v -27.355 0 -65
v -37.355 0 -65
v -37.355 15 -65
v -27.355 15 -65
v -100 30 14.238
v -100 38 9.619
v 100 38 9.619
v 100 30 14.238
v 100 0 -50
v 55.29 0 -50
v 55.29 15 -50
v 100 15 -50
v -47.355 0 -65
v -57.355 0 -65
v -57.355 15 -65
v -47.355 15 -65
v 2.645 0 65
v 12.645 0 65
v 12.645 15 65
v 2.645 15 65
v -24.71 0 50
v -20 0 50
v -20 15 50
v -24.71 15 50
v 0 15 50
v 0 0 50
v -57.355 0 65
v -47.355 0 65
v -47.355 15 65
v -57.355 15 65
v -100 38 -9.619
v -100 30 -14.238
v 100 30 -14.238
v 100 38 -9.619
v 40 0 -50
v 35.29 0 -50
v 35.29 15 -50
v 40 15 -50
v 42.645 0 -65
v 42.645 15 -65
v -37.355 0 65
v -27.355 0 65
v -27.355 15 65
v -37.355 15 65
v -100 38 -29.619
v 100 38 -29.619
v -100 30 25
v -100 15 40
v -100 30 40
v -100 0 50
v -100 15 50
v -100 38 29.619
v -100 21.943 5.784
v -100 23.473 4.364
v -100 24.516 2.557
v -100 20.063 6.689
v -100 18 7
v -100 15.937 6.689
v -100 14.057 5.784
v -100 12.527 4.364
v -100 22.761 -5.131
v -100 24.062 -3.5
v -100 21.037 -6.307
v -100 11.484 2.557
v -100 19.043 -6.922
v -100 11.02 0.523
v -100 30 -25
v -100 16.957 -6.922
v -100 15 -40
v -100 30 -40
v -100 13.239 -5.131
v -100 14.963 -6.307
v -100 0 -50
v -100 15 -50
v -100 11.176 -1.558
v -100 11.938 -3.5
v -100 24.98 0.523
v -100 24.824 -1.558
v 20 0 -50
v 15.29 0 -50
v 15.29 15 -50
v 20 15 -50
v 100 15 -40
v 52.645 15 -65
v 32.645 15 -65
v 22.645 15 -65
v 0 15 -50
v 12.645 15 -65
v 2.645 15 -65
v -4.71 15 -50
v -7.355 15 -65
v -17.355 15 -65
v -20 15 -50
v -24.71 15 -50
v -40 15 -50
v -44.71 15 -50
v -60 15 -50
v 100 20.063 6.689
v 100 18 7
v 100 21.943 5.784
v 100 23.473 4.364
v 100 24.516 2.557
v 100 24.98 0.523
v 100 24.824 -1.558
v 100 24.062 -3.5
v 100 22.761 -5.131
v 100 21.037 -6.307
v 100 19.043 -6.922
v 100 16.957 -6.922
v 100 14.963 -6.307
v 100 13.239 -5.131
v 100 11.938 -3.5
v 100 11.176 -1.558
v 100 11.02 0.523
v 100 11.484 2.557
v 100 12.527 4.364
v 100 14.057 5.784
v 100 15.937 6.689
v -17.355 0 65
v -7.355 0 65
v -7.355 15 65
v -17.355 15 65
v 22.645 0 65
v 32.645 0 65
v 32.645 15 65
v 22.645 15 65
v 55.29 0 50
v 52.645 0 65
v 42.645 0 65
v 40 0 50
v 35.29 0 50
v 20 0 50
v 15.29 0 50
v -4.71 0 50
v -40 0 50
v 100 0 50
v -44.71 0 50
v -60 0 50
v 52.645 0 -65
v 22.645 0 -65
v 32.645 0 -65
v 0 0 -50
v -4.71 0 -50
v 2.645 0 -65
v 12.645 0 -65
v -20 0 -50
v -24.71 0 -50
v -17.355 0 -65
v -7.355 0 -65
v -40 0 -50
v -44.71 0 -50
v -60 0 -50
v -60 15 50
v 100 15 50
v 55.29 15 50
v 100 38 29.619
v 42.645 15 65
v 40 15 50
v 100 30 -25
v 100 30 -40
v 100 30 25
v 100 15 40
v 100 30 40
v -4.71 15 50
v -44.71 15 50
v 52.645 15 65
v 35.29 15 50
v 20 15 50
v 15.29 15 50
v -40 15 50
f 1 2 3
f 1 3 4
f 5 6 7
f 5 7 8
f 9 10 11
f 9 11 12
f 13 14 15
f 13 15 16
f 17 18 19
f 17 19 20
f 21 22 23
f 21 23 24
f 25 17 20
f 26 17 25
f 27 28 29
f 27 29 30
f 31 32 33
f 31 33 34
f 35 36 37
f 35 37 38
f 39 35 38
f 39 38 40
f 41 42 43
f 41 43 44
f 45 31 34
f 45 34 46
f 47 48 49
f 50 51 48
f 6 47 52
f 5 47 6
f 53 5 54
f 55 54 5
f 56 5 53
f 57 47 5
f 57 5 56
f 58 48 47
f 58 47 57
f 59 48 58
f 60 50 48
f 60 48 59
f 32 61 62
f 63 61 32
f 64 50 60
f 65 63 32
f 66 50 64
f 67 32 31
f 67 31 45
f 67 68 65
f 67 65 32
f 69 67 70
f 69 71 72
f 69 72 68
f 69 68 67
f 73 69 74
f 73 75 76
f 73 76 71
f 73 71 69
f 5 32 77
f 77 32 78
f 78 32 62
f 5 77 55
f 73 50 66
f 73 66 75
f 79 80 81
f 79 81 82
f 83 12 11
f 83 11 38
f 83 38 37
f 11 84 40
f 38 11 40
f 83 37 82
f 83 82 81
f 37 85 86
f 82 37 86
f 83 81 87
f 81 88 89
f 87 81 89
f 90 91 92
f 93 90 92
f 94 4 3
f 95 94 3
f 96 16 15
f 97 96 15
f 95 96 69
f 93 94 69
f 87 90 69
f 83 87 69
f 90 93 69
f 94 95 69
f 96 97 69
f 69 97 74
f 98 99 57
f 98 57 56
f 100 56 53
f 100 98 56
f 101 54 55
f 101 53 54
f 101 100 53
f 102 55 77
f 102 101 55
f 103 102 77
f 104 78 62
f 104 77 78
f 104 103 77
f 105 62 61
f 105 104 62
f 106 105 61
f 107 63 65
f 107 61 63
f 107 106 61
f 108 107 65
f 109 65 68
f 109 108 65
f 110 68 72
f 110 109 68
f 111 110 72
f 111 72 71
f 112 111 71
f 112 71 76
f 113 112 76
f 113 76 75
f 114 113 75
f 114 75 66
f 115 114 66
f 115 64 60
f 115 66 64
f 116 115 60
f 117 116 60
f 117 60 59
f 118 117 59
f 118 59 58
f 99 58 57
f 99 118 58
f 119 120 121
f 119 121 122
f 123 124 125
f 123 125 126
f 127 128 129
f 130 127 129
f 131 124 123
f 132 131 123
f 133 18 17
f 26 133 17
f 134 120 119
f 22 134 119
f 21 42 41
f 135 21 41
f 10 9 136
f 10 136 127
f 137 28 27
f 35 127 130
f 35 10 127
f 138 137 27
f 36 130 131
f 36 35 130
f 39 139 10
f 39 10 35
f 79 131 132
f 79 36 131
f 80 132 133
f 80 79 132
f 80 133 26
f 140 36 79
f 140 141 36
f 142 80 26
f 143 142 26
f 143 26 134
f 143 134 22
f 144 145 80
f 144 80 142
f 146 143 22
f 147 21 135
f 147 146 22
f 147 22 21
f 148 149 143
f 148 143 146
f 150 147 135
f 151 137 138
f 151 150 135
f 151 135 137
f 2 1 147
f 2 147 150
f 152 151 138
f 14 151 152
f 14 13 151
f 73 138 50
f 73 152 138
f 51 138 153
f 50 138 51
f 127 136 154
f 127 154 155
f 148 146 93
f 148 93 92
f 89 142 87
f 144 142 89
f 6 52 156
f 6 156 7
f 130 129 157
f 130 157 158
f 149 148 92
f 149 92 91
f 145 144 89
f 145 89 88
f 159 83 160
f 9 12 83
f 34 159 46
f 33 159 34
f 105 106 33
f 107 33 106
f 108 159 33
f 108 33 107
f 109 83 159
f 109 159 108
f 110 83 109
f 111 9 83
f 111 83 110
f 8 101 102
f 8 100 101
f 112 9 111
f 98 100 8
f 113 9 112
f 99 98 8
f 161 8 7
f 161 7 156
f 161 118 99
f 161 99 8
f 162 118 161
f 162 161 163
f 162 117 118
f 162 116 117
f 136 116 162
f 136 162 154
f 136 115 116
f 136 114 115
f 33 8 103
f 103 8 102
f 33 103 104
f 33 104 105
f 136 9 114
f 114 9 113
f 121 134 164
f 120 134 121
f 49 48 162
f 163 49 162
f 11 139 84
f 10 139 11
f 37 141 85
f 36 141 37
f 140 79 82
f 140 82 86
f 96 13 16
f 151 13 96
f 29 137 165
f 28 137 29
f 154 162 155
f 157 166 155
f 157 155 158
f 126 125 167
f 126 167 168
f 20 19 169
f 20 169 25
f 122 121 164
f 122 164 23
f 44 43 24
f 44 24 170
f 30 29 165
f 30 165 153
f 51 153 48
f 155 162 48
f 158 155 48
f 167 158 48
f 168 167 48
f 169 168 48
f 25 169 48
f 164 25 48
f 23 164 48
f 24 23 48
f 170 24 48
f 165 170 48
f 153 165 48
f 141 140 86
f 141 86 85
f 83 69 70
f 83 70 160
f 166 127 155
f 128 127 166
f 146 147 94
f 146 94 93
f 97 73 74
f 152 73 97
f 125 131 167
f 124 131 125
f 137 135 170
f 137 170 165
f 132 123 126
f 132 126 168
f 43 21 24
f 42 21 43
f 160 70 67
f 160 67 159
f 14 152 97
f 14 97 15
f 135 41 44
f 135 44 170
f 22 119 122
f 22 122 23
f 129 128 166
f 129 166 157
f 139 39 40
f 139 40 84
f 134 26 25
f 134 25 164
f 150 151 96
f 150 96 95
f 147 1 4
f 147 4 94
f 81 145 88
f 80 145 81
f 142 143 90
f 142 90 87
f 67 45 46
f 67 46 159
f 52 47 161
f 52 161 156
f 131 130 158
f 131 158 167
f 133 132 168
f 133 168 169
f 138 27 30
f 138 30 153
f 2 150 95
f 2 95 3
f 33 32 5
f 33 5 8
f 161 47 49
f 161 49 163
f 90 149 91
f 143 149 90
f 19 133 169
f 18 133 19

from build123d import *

# Parameters (mm, degrees)
BOSS_EXTRUDE1_DEPTH     = 15
SKETCH2_W               = 200
SKETCH2_H               = 80
BOSS_EXTRUDE2_DEPTH     = 15
BOSS_EXTRUDE3_DEPTH     = 200
CUT_EXTRUDE1_DEPTH      = 214.703065022
CUT_EXTRUDE1_DEPTH_BACK = 214.703065022
SKETCH4_R               = 7


with BuildPart() as part:
    # Sketch1 → Boss-Extrude1 (new body)
    with BuildSketch(Plane(origin=(0, 0, 0), x_dir=(1, 0, 0), z_dir=(0, 1, 0))):
        Polygon((-60, 50), (-57.355095289, 65), (-47.355095289, 65), (-44.710190579, 50), (-40, 50), (-37.355095289, 65), (-27.355095289, 65), (-24.710190579, 50), (-20, 50), (-17.355095289, 65), (-7.355095289, 65), (-4.710190579, 50), (0, 50), (2.644904711, 65), (12.644904711, 65), (15.289809421, 50), (20, 50), (22.644904711, 65), (32.644904711, 65), (35.289809421, 50), (40, 50), (42.644904711, 65), (52.644904711, 65), (55.289809421, 50), (100, 50), (100, -50), (55.289809421, -50), (52.644904711, -65), (42.644904711, -65), (40, -50), (35.289809421, -50), (32.644904711, -65), (22.644904711, -65), (20, -50), (15.289809421, -50), (12.644904711, -65), (2.644904711, -65), (0, -50), (-4.710190579, -50), (-7.355095289, -65), (-17.355095289, -65), (-20, -50), (-24.710190579, -50), (-27.355095289, -65), (-37.355095289, -65), (-40, -50), (-44.710190579, -50), (-47.355095289, -65), (-57.355095289, -65), (-60, -50), (-100, -50), (-100, 50), align=None)
    extrude(amount=BOSS_EXTRUDE1_DEPTH)

    # Sketch2 → Boss-Extrude2 (add)
    with BuildSketch(Plane(origin=(0, 15, 0), x_dir=(1, 0, 0), z_dir=(0, 1, 0))):
        Rectangle(SKETCH2_W, SKETCH2_H)
    extrude(amount=BOSS_EXTRUDE2_DEPTH)

    # Sketch3 → Boss-Extrude3 (add)
    with BuildSketch(Plane.ZY.offset(100)):
        Polygon((25, 30), (29.618802154, 38), (9.618802154, 38), (14.237604307, 30), align=None)
        Polygon((-25, 30), (-14.237604307, 30), (-9.618802154, 38), (-29.618802154, 38), align=None)
    extrude(amount=-BOSS_EXTRUDE3_DEPTH)

    # Sketch4 → Cut-Extrude1 (cut, two sides: drawn at the far end of the back side and taken through both)
    with BuildSketch(Plane.ZY.offset(100).offset(-CUT_EXTRUDE1_DEPTH_BACK)):
        with Locations((0, 18)):
            Circle(SKETCH4_R)
    extrude(amount=CUT_EXTRUDE1_DEPTH + CUT_EXTRUDE1_DEPTH_BACK, mode=Mode.SUBTRACT)


solid = part.part
